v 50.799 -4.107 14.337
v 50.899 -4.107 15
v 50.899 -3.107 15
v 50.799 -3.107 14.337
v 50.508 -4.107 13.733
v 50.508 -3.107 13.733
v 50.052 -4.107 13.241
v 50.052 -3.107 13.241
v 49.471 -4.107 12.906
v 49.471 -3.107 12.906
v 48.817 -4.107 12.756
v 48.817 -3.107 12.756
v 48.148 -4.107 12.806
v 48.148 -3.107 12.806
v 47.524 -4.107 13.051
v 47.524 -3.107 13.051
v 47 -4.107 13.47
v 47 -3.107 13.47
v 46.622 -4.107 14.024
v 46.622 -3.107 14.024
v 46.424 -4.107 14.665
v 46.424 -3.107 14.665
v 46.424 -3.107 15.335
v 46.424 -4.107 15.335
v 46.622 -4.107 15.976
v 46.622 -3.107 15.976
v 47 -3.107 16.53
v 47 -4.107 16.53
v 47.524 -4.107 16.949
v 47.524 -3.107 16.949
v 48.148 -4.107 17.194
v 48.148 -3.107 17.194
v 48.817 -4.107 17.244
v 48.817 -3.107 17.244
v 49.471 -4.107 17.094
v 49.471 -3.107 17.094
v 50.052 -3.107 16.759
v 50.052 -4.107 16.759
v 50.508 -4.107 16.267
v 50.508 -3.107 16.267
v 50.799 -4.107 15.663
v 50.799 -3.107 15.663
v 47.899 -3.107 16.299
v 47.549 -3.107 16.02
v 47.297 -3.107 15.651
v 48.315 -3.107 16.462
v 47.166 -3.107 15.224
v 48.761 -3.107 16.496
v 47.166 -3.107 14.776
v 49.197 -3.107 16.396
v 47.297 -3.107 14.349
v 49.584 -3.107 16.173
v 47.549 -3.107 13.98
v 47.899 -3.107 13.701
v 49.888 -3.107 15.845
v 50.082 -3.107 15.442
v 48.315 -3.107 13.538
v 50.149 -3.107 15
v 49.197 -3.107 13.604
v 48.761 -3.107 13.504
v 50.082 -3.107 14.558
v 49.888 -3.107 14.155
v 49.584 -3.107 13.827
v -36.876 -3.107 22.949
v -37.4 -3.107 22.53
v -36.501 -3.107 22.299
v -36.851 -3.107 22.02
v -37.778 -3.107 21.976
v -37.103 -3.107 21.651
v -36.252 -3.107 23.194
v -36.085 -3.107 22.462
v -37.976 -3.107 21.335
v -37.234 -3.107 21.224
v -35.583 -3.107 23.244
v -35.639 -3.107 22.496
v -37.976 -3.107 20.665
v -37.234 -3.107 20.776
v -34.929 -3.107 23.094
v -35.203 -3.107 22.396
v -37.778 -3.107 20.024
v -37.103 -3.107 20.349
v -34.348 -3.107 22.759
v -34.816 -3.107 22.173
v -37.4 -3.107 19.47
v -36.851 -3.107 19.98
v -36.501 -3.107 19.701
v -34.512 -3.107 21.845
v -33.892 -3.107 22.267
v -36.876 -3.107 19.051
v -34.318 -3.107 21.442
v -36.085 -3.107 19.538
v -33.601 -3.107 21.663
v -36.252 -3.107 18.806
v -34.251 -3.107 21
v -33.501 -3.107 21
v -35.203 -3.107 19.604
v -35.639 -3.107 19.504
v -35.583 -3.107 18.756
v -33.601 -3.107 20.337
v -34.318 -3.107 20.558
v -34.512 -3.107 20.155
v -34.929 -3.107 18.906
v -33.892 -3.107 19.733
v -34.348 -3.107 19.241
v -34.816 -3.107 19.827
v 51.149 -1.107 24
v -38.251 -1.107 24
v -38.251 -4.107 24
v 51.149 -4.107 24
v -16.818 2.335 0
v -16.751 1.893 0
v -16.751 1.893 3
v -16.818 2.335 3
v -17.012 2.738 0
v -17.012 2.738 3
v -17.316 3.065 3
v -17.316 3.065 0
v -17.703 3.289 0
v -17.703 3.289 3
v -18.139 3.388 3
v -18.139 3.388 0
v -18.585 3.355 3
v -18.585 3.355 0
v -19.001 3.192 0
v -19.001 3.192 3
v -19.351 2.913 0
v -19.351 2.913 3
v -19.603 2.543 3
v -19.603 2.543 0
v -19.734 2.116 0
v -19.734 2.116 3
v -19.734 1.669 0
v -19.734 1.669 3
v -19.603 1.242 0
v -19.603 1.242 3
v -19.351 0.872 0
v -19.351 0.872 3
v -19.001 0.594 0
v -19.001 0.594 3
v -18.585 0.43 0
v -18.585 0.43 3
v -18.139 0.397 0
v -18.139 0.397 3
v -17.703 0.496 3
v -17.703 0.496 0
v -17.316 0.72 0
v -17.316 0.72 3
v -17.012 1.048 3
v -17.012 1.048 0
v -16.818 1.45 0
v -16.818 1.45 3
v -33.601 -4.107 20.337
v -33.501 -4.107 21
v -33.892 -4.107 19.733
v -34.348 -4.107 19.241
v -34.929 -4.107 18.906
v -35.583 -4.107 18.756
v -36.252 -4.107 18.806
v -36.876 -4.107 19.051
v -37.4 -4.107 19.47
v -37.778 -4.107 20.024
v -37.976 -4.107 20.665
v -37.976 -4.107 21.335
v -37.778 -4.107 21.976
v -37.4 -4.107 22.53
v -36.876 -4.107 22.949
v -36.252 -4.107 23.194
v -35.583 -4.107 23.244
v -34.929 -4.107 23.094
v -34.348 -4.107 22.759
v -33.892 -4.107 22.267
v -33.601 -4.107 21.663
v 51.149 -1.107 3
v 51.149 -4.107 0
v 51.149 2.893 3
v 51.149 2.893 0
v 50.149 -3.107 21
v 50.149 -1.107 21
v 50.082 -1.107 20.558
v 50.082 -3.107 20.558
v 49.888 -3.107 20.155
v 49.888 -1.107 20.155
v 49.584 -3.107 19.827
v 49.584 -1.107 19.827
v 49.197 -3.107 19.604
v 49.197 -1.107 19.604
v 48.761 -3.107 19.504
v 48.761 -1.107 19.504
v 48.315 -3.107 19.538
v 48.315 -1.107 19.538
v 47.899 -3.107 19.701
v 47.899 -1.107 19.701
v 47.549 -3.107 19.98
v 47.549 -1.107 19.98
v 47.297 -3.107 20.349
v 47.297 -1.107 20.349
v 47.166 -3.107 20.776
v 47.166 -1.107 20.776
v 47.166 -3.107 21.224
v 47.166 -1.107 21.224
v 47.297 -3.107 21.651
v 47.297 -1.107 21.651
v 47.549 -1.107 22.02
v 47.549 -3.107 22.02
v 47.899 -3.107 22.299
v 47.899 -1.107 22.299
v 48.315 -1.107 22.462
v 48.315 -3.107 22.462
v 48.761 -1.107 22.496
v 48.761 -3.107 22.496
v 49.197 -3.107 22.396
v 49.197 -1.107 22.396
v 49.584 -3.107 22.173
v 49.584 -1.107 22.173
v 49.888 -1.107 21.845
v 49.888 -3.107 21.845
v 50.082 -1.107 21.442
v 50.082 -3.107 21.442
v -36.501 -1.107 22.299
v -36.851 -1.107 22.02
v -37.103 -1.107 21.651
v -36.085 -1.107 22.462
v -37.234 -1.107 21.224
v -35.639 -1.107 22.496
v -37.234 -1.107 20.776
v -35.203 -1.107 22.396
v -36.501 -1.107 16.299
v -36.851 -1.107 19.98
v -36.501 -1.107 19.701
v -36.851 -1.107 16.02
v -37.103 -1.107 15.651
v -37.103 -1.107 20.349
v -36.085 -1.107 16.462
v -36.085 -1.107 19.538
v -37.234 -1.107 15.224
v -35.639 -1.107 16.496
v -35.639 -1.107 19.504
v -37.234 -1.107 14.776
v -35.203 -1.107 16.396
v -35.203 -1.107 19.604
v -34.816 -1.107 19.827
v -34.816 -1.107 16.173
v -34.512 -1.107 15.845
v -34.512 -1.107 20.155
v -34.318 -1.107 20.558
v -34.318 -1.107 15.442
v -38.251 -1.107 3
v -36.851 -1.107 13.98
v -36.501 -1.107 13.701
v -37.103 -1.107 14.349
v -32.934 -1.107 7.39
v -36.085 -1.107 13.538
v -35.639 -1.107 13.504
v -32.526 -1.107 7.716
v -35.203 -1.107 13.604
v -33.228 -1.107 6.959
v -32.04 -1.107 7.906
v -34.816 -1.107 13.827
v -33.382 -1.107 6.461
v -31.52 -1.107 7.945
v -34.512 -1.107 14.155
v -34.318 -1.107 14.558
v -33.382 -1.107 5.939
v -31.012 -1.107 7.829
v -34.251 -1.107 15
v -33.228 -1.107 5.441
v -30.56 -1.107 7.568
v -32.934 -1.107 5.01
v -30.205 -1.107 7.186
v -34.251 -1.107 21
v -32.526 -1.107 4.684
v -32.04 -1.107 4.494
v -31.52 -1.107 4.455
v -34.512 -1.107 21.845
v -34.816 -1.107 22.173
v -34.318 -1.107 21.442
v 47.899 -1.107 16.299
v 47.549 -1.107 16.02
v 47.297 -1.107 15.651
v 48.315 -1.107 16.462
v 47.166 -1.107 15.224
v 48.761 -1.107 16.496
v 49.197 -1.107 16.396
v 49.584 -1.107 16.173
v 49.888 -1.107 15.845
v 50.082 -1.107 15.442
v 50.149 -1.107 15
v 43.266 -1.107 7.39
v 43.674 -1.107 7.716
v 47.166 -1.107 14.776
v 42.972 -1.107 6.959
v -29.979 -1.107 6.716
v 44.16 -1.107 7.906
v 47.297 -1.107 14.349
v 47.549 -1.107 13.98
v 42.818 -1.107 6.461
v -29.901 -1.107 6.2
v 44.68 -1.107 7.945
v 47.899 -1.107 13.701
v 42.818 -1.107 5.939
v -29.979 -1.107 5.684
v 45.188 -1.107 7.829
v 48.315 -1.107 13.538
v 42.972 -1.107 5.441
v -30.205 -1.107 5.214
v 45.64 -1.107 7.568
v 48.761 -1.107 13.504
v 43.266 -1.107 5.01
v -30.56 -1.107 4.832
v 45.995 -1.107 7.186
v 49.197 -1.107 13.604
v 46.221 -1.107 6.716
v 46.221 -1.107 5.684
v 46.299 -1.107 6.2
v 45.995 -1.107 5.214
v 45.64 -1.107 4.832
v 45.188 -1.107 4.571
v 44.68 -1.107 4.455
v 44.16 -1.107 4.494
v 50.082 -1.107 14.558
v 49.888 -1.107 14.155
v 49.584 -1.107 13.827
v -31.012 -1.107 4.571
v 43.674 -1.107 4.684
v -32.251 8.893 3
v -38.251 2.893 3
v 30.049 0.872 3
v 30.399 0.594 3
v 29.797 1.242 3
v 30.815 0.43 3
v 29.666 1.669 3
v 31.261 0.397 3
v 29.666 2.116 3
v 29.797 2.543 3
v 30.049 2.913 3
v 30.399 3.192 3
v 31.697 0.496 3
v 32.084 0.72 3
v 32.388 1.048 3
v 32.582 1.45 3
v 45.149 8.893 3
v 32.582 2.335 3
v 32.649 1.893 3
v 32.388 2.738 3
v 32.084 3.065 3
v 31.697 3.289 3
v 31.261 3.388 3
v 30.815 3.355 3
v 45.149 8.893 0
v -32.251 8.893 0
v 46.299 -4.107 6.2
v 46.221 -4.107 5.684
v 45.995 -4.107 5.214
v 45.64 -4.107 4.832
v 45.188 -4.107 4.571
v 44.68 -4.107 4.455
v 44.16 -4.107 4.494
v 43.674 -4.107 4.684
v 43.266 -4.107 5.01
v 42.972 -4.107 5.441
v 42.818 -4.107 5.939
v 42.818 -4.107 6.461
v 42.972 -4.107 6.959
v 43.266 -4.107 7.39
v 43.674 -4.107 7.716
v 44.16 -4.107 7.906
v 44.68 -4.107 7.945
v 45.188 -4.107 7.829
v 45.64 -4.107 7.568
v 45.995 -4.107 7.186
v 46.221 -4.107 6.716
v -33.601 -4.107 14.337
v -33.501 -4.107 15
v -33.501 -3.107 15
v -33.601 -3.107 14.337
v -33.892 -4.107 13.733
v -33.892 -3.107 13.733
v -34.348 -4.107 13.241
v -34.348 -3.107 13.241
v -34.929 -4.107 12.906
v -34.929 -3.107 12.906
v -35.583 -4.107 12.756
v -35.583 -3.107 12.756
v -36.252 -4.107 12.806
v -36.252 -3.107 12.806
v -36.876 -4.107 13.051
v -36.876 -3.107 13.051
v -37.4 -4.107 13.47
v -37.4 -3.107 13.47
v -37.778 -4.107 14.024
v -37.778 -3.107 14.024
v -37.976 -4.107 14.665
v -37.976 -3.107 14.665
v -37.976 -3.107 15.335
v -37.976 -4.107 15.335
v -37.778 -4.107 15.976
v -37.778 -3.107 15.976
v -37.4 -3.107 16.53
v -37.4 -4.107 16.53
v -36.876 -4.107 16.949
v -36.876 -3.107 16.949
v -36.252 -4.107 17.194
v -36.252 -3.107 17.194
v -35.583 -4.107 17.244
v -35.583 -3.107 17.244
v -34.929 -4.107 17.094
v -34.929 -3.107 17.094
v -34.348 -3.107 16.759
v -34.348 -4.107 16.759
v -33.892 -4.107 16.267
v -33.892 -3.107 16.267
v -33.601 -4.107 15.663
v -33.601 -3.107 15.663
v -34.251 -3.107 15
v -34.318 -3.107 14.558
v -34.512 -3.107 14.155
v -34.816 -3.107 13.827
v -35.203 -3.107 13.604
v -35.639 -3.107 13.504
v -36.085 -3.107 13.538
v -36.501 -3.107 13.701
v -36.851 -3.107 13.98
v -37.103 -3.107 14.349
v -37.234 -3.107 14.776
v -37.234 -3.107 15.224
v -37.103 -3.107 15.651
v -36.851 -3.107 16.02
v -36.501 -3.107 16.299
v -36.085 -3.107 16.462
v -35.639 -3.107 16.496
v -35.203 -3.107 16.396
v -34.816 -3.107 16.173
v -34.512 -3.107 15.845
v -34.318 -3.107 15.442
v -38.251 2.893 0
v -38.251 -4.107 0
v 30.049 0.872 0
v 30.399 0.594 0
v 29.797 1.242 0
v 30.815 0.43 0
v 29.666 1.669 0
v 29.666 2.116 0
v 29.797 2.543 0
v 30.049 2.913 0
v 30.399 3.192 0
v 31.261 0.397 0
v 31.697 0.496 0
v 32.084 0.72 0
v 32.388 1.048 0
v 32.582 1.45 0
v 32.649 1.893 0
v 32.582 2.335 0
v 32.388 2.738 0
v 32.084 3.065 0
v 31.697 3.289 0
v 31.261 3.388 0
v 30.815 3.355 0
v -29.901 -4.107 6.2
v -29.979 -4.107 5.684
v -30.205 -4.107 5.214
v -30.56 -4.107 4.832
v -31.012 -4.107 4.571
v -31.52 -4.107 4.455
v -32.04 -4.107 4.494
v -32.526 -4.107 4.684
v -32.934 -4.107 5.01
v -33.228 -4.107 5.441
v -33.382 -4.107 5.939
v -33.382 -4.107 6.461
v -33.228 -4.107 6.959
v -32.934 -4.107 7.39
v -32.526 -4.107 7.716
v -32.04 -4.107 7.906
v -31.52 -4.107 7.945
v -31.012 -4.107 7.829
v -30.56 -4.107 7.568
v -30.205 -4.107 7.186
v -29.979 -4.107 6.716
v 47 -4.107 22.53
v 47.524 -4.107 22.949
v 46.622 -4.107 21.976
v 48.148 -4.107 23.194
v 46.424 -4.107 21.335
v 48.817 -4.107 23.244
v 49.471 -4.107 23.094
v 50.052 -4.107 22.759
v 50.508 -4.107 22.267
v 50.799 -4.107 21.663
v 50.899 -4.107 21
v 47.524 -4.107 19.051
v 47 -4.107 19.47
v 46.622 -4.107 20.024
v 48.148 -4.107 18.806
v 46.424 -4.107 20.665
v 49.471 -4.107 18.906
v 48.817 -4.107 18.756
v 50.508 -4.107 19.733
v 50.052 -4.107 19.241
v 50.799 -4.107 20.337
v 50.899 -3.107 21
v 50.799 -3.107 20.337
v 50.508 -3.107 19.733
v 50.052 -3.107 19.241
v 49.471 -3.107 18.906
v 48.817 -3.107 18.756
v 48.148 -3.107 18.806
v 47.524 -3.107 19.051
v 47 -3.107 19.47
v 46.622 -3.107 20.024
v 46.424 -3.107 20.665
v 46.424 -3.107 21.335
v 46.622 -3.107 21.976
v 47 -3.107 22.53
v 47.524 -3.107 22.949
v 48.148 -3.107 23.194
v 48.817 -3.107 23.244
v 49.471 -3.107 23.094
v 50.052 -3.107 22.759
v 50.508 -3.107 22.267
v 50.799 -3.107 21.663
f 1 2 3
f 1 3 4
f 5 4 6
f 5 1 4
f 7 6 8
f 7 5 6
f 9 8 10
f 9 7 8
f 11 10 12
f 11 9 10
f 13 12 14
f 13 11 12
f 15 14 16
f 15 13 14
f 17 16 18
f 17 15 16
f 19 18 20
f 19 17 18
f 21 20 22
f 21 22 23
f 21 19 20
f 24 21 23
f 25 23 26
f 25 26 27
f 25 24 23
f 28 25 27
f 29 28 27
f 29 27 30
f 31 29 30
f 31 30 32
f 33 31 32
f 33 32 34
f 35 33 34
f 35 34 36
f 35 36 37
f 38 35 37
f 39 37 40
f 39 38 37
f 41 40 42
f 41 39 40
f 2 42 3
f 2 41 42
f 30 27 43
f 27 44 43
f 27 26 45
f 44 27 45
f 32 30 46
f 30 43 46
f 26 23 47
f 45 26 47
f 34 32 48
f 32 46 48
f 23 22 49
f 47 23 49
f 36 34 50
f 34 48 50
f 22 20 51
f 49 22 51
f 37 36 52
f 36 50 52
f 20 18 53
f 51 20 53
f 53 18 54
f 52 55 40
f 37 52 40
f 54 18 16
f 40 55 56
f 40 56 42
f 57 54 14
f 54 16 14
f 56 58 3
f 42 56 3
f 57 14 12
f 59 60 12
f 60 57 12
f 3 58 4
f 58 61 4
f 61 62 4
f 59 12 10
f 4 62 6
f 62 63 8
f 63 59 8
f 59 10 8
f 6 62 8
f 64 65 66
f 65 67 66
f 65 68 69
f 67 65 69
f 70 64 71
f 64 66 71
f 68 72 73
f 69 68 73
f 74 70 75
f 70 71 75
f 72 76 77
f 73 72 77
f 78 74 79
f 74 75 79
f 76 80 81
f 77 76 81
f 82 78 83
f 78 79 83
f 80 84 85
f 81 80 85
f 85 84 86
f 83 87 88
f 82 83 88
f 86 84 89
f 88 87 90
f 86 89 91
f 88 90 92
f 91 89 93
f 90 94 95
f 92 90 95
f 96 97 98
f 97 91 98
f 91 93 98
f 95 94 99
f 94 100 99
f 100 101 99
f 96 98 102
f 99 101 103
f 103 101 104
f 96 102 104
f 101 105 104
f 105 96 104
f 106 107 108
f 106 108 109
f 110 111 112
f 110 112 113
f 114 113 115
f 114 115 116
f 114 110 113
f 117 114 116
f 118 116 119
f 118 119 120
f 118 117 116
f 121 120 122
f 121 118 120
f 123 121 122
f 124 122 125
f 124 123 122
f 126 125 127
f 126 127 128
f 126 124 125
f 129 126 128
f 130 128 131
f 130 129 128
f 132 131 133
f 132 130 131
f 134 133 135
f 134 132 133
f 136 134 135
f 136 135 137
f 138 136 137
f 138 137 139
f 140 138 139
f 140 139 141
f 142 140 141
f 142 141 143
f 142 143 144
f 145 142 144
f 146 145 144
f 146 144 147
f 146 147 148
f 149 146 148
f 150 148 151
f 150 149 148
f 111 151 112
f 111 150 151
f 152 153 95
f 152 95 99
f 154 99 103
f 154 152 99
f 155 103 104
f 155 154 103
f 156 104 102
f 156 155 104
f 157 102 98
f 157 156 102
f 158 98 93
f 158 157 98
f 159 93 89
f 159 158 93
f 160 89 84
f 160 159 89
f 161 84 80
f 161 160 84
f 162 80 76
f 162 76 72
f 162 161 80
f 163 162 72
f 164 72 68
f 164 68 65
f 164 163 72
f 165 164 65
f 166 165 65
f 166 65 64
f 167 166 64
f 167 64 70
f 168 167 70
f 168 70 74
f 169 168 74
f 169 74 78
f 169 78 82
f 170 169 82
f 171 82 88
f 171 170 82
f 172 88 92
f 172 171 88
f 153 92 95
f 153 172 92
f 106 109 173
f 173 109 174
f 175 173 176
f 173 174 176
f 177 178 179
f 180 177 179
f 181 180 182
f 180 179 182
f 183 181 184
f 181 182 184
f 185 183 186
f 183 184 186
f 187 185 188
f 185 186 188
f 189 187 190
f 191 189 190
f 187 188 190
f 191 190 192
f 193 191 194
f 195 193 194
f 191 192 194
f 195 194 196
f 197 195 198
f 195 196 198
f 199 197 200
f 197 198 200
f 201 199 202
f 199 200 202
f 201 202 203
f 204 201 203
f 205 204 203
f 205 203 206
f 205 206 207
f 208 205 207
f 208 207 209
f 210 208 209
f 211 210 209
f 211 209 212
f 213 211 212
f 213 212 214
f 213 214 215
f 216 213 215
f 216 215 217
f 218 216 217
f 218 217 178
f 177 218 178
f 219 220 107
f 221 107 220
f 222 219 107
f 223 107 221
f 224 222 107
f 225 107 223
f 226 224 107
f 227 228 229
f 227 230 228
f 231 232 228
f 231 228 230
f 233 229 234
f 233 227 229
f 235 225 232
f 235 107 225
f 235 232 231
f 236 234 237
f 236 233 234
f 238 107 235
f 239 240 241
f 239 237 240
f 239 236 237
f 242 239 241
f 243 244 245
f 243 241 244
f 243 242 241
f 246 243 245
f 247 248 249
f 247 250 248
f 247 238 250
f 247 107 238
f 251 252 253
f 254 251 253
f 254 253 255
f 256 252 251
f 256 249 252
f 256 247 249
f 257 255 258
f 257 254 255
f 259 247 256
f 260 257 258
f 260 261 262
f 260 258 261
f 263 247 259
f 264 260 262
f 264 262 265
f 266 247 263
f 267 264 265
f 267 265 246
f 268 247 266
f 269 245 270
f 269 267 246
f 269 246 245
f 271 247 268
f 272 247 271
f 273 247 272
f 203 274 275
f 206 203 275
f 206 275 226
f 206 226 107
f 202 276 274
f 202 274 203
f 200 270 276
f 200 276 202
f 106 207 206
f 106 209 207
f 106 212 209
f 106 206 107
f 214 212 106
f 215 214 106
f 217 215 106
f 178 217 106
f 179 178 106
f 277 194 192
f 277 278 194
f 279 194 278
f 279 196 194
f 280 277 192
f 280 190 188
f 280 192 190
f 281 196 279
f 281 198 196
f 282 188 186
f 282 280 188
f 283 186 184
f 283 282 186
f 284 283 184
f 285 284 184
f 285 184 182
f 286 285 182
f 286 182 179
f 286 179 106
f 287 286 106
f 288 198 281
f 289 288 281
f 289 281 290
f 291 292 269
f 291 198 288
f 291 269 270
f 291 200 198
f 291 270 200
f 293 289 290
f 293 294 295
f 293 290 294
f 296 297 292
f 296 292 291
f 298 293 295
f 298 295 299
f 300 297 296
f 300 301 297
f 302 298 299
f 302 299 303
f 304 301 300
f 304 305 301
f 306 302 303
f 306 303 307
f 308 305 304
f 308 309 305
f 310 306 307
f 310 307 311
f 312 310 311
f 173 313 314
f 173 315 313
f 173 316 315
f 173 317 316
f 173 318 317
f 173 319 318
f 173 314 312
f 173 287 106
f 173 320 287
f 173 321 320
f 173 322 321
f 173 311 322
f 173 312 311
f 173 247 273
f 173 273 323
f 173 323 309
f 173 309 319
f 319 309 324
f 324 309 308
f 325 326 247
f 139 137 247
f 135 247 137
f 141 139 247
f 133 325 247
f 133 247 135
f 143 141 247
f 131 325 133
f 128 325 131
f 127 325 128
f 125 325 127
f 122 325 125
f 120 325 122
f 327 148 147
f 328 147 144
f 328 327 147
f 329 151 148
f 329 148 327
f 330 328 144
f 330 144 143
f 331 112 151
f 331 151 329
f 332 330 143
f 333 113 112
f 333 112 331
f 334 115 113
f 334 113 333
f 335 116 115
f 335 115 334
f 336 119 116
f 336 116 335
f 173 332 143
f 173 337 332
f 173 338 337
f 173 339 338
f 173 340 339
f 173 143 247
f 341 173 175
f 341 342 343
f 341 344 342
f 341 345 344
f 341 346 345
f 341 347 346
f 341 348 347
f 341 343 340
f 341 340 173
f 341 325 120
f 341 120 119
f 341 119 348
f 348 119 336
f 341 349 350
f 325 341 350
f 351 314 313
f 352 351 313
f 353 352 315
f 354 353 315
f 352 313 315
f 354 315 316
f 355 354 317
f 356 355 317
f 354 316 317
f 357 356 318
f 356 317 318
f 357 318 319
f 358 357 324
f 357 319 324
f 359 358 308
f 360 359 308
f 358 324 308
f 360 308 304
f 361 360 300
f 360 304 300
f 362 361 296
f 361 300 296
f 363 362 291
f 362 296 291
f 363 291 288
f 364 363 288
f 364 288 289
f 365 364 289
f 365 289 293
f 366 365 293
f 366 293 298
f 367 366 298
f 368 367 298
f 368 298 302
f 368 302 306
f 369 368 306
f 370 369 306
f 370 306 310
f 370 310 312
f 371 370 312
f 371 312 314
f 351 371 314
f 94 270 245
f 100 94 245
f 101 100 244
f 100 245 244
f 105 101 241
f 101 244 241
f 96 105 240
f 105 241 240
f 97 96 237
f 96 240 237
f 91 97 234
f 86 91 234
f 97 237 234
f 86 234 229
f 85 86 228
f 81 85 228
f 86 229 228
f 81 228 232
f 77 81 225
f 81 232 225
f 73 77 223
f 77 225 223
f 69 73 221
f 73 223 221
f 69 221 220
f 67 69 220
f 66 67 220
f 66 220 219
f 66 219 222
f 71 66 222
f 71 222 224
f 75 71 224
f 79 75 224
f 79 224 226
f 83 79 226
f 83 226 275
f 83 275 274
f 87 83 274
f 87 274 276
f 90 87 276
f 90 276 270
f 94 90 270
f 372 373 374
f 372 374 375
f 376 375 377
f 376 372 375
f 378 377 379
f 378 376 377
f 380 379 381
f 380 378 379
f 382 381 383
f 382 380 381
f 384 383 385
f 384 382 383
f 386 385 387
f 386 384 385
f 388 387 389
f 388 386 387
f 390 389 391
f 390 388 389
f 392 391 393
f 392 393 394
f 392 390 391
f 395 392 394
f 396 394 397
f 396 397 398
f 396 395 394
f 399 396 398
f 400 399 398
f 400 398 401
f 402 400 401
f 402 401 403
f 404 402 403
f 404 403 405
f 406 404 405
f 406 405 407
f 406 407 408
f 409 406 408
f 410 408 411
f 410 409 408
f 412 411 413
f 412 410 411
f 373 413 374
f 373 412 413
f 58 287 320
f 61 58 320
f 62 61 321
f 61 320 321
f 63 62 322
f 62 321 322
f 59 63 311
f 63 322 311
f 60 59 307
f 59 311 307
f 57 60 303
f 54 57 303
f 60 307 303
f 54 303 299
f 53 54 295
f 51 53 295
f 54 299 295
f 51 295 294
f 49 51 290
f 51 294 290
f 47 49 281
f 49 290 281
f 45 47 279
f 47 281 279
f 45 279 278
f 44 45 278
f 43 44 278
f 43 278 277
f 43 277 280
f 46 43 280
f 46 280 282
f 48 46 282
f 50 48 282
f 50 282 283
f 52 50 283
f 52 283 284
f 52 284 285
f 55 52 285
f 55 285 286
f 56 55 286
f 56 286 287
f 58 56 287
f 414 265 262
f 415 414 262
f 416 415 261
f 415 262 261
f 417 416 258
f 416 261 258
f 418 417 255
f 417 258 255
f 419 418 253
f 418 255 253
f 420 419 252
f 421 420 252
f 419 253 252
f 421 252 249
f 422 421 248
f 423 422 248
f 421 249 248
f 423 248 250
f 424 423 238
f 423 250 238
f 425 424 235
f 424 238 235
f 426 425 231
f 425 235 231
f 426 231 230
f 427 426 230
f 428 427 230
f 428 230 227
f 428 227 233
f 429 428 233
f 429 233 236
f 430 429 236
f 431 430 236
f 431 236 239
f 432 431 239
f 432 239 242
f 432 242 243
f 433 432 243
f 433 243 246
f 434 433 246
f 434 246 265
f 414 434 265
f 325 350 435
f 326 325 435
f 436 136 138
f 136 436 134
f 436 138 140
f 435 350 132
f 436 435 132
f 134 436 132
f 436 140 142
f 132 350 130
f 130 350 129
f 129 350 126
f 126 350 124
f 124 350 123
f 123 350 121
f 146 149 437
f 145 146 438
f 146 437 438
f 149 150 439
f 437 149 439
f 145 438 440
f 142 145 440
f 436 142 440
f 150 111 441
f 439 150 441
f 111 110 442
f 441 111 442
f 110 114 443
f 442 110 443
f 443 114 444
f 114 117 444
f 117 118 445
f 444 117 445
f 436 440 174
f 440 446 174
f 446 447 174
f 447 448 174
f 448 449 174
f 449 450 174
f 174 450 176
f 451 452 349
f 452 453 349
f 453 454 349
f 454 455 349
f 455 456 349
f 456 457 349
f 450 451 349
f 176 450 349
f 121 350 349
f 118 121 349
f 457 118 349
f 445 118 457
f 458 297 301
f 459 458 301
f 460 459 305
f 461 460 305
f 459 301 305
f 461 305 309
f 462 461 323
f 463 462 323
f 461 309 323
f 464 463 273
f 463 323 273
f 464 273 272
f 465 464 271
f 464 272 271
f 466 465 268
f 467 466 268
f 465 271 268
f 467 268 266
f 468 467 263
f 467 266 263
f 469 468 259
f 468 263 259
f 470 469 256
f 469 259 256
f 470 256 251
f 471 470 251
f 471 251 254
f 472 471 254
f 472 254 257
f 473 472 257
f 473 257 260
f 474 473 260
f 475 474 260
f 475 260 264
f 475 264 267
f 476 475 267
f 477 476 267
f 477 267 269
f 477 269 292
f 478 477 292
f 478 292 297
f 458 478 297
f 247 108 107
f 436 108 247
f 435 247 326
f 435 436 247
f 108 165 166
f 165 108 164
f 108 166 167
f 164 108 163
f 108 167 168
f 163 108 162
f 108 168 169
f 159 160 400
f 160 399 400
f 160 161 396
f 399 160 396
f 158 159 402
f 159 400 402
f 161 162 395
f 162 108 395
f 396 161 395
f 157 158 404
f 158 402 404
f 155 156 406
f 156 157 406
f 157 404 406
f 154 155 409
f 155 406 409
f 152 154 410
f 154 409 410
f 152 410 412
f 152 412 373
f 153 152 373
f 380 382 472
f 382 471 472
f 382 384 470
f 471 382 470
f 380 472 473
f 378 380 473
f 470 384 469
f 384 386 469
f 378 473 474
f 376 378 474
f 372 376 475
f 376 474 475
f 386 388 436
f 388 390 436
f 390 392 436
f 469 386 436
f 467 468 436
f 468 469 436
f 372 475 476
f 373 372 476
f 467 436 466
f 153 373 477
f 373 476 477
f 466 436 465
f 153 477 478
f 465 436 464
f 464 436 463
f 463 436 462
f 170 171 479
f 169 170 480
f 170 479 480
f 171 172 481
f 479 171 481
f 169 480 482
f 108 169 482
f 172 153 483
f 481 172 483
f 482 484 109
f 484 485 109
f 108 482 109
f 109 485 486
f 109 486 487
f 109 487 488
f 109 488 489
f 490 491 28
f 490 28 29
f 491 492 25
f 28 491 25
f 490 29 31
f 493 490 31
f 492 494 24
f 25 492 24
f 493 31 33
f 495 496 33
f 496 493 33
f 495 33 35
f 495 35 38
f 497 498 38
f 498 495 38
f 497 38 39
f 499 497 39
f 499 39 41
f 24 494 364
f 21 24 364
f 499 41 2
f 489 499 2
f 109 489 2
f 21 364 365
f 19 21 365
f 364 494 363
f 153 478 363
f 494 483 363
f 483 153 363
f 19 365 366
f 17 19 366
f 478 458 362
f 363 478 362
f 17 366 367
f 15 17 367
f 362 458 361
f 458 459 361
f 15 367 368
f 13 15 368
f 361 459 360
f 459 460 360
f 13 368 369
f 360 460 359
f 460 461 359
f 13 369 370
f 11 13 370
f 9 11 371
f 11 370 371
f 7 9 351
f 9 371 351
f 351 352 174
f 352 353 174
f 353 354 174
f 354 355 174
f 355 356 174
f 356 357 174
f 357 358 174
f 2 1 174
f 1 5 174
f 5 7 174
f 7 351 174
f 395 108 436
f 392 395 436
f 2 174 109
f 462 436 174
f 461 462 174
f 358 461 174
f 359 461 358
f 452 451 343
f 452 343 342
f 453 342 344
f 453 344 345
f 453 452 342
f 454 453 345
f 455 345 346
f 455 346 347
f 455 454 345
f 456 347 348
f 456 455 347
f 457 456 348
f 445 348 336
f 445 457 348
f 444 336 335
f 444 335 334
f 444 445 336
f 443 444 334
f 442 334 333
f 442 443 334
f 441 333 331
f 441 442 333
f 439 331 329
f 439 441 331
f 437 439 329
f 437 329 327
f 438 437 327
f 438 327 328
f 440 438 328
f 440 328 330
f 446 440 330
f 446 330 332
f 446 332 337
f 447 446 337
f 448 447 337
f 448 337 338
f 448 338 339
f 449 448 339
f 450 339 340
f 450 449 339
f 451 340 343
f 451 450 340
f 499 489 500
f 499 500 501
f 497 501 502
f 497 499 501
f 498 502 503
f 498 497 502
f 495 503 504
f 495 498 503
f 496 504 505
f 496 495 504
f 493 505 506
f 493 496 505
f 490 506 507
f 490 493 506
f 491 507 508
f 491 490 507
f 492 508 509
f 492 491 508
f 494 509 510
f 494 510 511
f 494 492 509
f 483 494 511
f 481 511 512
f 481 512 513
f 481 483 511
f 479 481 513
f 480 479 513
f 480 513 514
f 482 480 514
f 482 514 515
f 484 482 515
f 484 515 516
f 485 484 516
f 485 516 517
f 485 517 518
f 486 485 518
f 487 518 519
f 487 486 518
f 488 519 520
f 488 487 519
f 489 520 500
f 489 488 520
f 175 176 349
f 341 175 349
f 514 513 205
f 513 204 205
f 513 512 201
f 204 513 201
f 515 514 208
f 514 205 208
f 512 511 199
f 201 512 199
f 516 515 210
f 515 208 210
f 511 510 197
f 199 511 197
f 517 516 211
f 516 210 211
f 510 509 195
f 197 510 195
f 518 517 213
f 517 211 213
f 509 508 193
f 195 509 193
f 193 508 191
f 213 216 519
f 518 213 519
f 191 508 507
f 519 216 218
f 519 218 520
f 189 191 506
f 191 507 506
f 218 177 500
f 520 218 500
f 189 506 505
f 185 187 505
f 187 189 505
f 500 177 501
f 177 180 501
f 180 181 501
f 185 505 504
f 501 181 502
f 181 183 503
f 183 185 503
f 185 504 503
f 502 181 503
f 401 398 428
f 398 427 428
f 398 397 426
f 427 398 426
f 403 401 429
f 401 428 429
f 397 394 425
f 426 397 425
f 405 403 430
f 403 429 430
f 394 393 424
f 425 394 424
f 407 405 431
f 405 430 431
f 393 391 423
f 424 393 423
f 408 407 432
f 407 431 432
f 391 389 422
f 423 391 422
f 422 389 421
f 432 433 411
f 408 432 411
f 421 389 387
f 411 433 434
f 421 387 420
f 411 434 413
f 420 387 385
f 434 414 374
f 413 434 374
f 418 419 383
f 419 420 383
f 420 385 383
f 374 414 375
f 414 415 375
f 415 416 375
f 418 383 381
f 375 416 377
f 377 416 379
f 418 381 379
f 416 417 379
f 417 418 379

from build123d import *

# Parameters (mm, degrees)
SKETCH1_R           = 1.5
BOSS_EXTRUDE1_DEPTH = 3
SKETCH1_3_W         = 89.4
SKETCH1_3_H         = 3
BOSS_EXTRUDE2_DEPTH = 24
CUT_EXTRUDE1_REACH  = 5
SKETCH3_R           = 1.5
SKETCH3_R_2         = 1.75
CUT_EXTRUDE2_START  = -3
SKETCH3_5_R         = 2.25
SKETCH3_5_R_2       = 1.5
CUT_EXTRUDE2_DEPTH  = 1


with BuildPart() as part:
    # Sketch1 → Boss-Extrude1 (new body)
    with BuildSketch(Plane.XY):
        Polygon((-32.2510699, 8.892599614), (-38.2510699, 2.892599614), (-38.2510699, -1.107400386), (51.1489301, -1.107400386), (51.1489301, 2.892599614), (45.1489301, 8.892599614), align=None)
        with Locations((-18.2510699, 1.892599614)):
            Circle(SKETCH1_R, mode=Mode.SUBTRACT)
        with Locations((31.1489301, 1.892599614)):
            Circle(SKETCH1_R, mode=Mode.SUBTRACT)
    extrude(amount=BOSS_EXTRUDE1_DEPTH)

    # Sketch1<3> → Boss-Extrude2 (add)
    with BuildSketch(Plane.XY):
        with Locations((6.4489301, -2.607400386)):
            Rectangle(SKETCH1_3_W, SKETCH1_3_H)
    extrude(amount=BOSS_EXTRUDE2_DEPTH)

    # Sketch3 → Cut-Extrude1 (cut, up to next)
    with BuildSketch(Plane(origin=(0, -1.107400386, 0), x_dir=(1, 0, 0), z_dir=(0, 1, 0)), mode=Mode.PRIVATE) as cut_extrude1_sk1:
        with Locations((48.6489301, -15)):
            Circle(SKETCH3_R)
    cut_extrude1_tool1 = extrude(cut_extrude1_sk1.sketch, amount=-CUT_EXTRUDE1_REACH, mode=Mode.PRIVATE) & part.part
    add(cut_extrude1_tool1.solids().sort_by_distance((48.64893, -1.1074, 15))[0], mode=Mode.SUBTRACT)
    # Sketch3 → Cut-Extrude1 (cut, up to next)
    with BuildSketch(Plane(origin=(0, -1.107400386, 0), x_dir=(1, 0, 0), z_dir=(0, 1, 0)), mode=Mode.PRIVATE) as cut_extrude1_sk2:
        with Locations((48.6489301, -21)):
            Circle(SKETCH3_R)
    cut_extrude1_tool2 = extrude(cut_extrude1_sk2.sketch, amount=-CUT_EXTRUDE1_REACH, mode=Mode.PRIVATE) & part.part
    add(cut_extrude1_tool2.solids().sort_by_distance((48.64893, -1.1074, 21))[0], mode=Mode.SUBTRACT)
    # Sketch3 → Cut-Extrude1 (cut, up to next)
    with BuildSketch(Plane(origin=(0, -1.107400386, 0), x_dir=(1, 0, 0), z_dir=(0, 1, 0)), mode=Mode.PRIVATE) as cut_extrude1_sk3:
        with Locations((-35.7510699, -15)):
            Circle(SKETCH3_R)
    cut_extrude1_tool3 = extrude(cut_extrude1_sk3.sketch, amount=-CUT_EXTRUDE1_REACH, mode=Mode.PRIVATE) & part.part
    add(cut_extrude1_tool3.solids().sort_by_distance((-35.75107, -1.1074, 15))[0], mode=Mode.SUBTRACT)
    # Sketch3 → Cut-Extrude1 (cut, up to next)
    with BuildSketch(Plane(origin=(0, -1.107400386, 0), x_dir=(1, 0, 0), z_dir=(0, 1, 0)), mode=Mode.PRIVATE) as cut_extrude1_sk4:
        with Locations((-35.7510699, -21)):
            Circle(SKETCH3_R)
    cut_extrude1_tool4 = extrude(cut_extrude1_sk4.sketch, amount=-CUT_EXTRUDE1_REACH, mode=Mode.PRIVATE) & part.part
    add(cut_extrude1_tool4.solids().sort_by_distance((-35.75107, -1.1074, 21))[0], mode=Mode.SUBTRACT)
    # Sketch3 → Cut-Extrude1 (cut, up to next)
    with BuildSketch(Plane(origin=(0, -1.107400386, 0), x_dir=(1, 0, 0), z_dir=(0, 1, 0)), mode=Mode.PRIVATE) as cut_extrude1_sk5:
        with Locations((44.5489301, -6.2)):
            Circle(SKETCH3_R_2)
    cut_extrude1_tool5 = extrude(cut_extrude1_sk5.sketch, amount=-CUT_EXTRUDE1_REACH, mode=Mode.PRIVATE) & part.part
    add(cut_extrude1_tool5.solids().sort_by_distance((44.54893, -1.1074, 6.2))[0], mode=Mode.SUBTRACT)
    # Sketch3 → Cut-Extrude1 (cut, up to next)
    with BuildSketch(Plane(origin=(0, -1.107400386, 0), x_dir=(1, 0, 0), z_dir=(0, 1, 0)), mode=Mode.PRIVATE) as cut_extrude1_sk6:
        with Locations((-31.6510699, -6.2)):
            Circle(SKETCH3_R_2)
    cut_extrude1_tool6 = extrude(cut_extrude1_sk6.sketch, amount=-CUT_EXTRUDE1_REACH, mode=Mode.PRIVATE) & part.part
    add(cut_extrude1_tool6.solids().sort_by_distance((-31.65107, -1.1074, 6.2))[0], mode=Mode.SUBTRACT)

    # Sketch3<5> → Cut-Extrude2 (cut)
    with BuildSketch(Plane(origin=(0, -1.107400386, 0), x_dir=(1, 0, 0), z_dir=(0, 1, 0)).offset(CUT_EXTRUDE2_START)):
        with Locations((-35.7510699, -15)):
            Circle(SKETCH3_5_R)
        with Locations((-35.7510699, -15)):
            Circle(SKETCH3_5_R_2, mode=Mode.SUBTRACT)
        with Locations((-35.7510699, -21)):
            Circle(SKETCH3_5_R)
        with Locations((-35.7510699, -21)):
            Circle(SKETCH3_5_R_2, mode=Mode.SUBTRACT)
        with Locations((48.6489301, -15)):
            Circle(SKETCH3_5_R)
        with Locations((48.6489301, -21)):
            Circle(SKETCH3_5_R)
    extrude(amount=CUT_EXTRUDE2_DEPTH, mode=Mode.SUBTRACT)


solid = part.part
